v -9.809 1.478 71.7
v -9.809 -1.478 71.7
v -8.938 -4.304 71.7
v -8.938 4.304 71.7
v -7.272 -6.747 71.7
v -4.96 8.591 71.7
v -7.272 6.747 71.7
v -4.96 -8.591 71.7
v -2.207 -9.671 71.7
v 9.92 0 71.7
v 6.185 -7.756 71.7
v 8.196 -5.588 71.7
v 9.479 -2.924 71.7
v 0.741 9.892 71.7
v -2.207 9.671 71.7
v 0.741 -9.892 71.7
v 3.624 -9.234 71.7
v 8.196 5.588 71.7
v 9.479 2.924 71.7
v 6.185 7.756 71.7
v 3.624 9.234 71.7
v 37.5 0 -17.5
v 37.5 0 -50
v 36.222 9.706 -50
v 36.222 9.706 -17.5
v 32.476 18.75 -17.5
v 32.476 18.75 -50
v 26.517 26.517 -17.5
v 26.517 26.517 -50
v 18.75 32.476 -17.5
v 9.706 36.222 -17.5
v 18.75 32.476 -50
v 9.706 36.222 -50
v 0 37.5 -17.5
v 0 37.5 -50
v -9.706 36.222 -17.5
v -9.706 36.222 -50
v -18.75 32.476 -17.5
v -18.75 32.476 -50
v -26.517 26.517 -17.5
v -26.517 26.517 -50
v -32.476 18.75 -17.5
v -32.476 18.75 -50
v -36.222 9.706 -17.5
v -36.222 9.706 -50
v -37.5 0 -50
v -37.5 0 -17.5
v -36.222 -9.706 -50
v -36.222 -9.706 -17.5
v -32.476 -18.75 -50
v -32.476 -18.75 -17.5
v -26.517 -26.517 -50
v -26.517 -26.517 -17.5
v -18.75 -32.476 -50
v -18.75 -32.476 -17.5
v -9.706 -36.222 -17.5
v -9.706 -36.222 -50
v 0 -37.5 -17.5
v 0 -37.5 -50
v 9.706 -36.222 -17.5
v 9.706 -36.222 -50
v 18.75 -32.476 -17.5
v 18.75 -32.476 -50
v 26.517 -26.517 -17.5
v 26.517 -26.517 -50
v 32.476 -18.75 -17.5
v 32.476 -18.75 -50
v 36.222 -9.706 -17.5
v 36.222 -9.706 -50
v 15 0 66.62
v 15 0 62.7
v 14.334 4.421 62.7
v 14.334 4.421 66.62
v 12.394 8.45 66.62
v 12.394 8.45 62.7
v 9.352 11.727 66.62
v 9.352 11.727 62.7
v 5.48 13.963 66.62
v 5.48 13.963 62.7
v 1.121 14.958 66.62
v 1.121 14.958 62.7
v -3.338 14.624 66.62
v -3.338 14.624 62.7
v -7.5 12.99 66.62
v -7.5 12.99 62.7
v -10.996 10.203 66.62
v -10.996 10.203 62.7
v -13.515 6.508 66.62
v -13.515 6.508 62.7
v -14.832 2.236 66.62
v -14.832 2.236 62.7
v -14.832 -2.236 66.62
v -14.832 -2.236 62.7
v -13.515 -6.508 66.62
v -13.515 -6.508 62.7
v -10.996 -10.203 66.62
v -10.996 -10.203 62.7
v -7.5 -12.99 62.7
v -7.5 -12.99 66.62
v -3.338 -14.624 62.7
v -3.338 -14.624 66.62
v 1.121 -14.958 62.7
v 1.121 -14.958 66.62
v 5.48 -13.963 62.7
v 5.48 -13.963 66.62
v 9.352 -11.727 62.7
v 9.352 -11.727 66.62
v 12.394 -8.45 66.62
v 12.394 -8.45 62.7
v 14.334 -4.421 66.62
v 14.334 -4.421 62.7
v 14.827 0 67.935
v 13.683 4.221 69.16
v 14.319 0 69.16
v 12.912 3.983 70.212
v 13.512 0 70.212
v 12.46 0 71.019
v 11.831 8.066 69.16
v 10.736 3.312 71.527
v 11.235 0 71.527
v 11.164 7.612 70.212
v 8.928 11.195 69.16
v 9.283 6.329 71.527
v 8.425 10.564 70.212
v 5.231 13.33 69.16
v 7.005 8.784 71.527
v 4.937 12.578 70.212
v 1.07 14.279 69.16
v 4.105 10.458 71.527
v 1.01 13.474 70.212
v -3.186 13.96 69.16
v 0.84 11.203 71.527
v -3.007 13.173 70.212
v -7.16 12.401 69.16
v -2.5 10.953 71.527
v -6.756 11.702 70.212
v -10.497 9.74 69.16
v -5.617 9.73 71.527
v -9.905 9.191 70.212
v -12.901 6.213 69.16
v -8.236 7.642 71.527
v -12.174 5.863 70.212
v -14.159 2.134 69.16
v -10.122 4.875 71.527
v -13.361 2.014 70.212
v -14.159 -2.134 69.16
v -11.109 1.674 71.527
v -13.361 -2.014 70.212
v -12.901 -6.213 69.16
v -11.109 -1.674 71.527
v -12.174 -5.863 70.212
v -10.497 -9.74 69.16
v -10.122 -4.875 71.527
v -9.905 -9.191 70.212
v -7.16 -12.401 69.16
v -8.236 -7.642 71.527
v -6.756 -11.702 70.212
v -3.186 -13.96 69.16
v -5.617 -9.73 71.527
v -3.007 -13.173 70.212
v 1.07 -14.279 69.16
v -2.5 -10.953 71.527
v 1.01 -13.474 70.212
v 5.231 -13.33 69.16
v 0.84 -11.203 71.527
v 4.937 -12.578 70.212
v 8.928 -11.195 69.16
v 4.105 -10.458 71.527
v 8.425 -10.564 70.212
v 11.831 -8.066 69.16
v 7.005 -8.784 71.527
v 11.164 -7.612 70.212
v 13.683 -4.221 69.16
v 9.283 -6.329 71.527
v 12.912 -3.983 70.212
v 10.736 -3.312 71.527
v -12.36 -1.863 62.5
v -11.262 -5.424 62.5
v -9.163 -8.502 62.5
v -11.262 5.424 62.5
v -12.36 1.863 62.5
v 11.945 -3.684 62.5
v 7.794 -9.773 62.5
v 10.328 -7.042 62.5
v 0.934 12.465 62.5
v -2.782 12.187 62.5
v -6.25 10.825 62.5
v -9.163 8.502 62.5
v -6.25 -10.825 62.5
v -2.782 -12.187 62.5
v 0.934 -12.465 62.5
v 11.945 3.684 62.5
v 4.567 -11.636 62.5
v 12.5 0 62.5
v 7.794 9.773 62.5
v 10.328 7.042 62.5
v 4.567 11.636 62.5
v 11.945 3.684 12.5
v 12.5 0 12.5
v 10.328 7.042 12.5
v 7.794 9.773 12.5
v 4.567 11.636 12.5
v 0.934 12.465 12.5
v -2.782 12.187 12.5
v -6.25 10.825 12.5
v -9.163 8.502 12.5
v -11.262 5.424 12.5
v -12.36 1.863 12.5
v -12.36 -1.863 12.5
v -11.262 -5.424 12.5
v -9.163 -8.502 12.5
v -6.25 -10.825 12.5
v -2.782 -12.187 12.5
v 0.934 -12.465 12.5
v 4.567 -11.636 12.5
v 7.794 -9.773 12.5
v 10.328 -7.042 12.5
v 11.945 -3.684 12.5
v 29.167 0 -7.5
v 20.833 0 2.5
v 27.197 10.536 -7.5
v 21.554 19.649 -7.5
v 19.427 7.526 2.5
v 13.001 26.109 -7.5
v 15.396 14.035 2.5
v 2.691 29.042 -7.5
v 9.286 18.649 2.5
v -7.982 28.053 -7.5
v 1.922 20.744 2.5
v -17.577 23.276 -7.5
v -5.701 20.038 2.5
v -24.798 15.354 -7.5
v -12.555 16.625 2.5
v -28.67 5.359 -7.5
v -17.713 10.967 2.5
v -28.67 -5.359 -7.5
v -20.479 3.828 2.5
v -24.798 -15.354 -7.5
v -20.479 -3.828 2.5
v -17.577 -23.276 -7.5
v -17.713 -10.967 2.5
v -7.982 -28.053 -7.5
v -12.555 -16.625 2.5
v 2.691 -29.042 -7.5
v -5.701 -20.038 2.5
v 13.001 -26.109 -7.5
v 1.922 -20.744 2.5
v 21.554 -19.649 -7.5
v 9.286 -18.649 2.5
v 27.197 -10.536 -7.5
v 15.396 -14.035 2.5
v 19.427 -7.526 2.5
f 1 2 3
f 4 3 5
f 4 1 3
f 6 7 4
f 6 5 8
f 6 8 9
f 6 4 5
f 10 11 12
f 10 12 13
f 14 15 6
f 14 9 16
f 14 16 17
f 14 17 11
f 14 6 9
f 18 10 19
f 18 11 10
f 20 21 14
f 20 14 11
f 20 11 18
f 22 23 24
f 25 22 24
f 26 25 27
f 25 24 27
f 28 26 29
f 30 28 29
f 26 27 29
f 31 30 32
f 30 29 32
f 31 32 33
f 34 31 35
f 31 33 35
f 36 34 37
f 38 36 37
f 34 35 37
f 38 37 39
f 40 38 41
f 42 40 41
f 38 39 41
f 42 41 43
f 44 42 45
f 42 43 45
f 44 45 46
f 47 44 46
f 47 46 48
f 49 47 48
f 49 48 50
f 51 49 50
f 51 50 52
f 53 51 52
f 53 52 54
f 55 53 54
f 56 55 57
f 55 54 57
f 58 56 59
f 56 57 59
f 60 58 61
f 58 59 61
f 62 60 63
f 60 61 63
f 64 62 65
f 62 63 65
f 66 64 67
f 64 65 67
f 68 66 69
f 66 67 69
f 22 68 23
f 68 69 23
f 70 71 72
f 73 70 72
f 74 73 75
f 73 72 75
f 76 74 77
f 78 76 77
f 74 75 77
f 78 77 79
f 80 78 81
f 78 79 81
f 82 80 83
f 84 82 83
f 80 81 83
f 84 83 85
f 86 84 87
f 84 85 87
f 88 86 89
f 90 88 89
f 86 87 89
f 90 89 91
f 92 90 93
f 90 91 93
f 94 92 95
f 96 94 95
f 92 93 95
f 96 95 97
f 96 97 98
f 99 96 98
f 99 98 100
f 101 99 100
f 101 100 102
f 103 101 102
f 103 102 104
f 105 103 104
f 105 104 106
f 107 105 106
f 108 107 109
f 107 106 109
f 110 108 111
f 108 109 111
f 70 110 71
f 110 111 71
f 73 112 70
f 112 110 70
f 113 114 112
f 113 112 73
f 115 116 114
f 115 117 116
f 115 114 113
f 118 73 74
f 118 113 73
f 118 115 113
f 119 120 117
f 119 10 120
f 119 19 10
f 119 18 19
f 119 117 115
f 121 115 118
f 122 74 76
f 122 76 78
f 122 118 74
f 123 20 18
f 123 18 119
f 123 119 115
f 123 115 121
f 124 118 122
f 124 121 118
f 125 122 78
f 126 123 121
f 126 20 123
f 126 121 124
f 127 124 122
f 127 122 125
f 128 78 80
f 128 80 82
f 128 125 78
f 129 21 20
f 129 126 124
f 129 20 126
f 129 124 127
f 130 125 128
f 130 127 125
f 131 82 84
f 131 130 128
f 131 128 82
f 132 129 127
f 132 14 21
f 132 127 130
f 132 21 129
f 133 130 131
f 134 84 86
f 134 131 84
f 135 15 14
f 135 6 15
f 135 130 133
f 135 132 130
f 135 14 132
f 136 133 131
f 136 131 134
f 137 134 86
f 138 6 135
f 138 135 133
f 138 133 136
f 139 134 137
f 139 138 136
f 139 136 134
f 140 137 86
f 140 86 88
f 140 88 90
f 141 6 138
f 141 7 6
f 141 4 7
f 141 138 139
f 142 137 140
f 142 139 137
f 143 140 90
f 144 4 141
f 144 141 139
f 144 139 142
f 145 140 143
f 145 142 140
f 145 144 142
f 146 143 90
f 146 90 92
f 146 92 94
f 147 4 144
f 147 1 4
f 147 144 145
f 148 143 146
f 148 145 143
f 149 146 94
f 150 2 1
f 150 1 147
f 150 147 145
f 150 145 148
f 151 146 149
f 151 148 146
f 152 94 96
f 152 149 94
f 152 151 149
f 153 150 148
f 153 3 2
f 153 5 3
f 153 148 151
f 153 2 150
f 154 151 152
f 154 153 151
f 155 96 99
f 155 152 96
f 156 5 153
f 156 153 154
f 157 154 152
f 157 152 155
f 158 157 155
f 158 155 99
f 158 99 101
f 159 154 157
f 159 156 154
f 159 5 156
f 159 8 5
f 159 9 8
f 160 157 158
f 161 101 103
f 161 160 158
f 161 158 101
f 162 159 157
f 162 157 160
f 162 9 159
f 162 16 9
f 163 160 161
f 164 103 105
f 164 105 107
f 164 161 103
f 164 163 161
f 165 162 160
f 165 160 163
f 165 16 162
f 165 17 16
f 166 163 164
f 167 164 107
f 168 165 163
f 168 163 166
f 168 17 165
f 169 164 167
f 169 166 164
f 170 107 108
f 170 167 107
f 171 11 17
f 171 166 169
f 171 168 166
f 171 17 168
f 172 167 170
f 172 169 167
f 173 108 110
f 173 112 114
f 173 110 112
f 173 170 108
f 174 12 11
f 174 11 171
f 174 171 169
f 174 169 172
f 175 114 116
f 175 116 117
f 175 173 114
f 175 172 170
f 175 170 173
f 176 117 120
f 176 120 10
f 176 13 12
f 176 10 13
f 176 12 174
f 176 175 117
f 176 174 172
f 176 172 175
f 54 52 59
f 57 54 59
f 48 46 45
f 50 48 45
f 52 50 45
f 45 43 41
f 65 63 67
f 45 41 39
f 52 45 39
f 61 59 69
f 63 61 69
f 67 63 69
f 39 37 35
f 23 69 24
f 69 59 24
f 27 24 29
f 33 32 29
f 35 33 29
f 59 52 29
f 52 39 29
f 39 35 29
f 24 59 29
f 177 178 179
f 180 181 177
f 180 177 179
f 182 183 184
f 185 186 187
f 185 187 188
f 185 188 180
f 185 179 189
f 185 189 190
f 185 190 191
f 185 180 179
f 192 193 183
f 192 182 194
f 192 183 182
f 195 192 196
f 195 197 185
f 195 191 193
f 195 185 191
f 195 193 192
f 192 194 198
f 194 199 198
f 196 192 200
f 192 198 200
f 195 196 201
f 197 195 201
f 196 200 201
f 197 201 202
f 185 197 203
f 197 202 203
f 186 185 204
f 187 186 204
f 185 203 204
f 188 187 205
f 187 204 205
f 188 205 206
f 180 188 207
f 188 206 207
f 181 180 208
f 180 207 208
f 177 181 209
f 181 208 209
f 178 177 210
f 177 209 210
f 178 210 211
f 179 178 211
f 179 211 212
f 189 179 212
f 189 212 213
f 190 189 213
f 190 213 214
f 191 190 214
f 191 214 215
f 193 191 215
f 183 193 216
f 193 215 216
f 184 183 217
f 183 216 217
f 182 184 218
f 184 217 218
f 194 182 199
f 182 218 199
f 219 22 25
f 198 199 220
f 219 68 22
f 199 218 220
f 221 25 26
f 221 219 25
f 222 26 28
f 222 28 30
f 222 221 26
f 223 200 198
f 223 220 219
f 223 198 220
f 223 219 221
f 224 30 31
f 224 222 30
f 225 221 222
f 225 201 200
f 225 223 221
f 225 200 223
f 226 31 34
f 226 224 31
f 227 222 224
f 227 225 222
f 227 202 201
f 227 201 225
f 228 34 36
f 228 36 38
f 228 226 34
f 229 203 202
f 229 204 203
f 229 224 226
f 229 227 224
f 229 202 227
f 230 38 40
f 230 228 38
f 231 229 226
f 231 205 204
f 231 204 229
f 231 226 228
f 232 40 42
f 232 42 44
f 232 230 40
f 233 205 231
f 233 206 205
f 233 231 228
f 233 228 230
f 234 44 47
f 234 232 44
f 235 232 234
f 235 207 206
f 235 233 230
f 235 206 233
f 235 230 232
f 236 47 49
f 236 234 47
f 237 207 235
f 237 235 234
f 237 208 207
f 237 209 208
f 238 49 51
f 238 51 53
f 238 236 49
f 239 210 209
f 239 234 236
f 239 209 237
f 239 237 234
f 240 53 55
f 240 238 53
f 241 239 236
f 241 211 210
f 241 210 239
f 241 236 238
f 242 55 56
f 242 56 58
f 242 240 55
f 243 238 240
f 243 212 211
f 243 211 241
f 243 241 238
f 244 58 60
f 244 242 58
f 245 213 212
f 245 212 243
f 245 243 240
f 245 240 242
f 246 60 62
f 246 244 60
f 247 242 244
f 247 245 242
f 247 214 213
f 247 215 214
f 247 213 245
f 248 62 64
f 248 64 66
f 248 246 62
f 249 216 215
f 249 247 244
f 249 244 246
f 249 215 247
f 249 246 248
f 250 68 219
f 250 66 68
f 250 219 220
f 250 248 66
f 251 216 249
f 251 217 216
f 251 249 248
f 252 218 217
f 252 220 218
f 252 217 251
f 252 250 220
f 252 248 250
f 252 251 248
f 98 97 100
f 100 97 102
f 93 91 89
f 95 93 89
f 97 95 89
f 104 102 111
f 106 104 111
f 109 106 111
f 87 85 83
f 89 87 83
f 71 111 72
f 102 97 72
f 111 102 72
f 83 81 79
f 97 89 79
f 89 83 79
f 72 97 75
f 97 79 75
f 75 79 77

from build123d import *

# Parameters (mm, degrees)
F6_R      = 15
F7_DEPTH  = 9
F8_R      = 5.08
F2_R      = 37.5
F13_DEPTH = 32.5
F10_R     = 37.5
F12_R     = 12.5
F15_DEPTH = 37.5
F4_R      = 12.5
F16_DEPTH = 12.5


with BuildPart() as f7:
    # F6 (on offset) → F7 (new body)
    with BuildSketch(Plane.XY.offset(62.7)):
        Circle(F6_R)
    extrude(amount=F7_DEPTH)

    # F8
    f8_edges = [f7.edges().sort_by_distance(p)[0] for p in [
        (-15, 0, 71.7),
    ]]
    fillet(f8_edges, radius=F8_R)


with BuildPart() as f13:
    # F2 (on offset) → F13 (new body)
    with BuildSketch(Plane.XY.offset(-50)):
        Circle(F2_R)
    extrude(amount=F13_DEPTH)

    # F10 (on offset) → F14 section 0
    with BuildSketch(Plane.XY.offset(-17.5)):
        Circle(F10_R)
    # F12 (on offset) → F14 section 1
    with BuildSketch(Plane.XY.offset(12.5)):
        Circle(F12_R)
    loft()

    # F12 (on offset) → F15 (join)
    with BuildSketch(Plane.XY.offset(12.5)):
        Circle(F12_R)
    extrude(amount=F15_DEPTH)

    # F4 (on offset) → F16 (join)
    with BuildSketch(Plane.XY.offset(50)):
        Circle(F4_R)
    extrude(amount=F16_DEPTH)


solid = Compound([f7.part, f13.part])
